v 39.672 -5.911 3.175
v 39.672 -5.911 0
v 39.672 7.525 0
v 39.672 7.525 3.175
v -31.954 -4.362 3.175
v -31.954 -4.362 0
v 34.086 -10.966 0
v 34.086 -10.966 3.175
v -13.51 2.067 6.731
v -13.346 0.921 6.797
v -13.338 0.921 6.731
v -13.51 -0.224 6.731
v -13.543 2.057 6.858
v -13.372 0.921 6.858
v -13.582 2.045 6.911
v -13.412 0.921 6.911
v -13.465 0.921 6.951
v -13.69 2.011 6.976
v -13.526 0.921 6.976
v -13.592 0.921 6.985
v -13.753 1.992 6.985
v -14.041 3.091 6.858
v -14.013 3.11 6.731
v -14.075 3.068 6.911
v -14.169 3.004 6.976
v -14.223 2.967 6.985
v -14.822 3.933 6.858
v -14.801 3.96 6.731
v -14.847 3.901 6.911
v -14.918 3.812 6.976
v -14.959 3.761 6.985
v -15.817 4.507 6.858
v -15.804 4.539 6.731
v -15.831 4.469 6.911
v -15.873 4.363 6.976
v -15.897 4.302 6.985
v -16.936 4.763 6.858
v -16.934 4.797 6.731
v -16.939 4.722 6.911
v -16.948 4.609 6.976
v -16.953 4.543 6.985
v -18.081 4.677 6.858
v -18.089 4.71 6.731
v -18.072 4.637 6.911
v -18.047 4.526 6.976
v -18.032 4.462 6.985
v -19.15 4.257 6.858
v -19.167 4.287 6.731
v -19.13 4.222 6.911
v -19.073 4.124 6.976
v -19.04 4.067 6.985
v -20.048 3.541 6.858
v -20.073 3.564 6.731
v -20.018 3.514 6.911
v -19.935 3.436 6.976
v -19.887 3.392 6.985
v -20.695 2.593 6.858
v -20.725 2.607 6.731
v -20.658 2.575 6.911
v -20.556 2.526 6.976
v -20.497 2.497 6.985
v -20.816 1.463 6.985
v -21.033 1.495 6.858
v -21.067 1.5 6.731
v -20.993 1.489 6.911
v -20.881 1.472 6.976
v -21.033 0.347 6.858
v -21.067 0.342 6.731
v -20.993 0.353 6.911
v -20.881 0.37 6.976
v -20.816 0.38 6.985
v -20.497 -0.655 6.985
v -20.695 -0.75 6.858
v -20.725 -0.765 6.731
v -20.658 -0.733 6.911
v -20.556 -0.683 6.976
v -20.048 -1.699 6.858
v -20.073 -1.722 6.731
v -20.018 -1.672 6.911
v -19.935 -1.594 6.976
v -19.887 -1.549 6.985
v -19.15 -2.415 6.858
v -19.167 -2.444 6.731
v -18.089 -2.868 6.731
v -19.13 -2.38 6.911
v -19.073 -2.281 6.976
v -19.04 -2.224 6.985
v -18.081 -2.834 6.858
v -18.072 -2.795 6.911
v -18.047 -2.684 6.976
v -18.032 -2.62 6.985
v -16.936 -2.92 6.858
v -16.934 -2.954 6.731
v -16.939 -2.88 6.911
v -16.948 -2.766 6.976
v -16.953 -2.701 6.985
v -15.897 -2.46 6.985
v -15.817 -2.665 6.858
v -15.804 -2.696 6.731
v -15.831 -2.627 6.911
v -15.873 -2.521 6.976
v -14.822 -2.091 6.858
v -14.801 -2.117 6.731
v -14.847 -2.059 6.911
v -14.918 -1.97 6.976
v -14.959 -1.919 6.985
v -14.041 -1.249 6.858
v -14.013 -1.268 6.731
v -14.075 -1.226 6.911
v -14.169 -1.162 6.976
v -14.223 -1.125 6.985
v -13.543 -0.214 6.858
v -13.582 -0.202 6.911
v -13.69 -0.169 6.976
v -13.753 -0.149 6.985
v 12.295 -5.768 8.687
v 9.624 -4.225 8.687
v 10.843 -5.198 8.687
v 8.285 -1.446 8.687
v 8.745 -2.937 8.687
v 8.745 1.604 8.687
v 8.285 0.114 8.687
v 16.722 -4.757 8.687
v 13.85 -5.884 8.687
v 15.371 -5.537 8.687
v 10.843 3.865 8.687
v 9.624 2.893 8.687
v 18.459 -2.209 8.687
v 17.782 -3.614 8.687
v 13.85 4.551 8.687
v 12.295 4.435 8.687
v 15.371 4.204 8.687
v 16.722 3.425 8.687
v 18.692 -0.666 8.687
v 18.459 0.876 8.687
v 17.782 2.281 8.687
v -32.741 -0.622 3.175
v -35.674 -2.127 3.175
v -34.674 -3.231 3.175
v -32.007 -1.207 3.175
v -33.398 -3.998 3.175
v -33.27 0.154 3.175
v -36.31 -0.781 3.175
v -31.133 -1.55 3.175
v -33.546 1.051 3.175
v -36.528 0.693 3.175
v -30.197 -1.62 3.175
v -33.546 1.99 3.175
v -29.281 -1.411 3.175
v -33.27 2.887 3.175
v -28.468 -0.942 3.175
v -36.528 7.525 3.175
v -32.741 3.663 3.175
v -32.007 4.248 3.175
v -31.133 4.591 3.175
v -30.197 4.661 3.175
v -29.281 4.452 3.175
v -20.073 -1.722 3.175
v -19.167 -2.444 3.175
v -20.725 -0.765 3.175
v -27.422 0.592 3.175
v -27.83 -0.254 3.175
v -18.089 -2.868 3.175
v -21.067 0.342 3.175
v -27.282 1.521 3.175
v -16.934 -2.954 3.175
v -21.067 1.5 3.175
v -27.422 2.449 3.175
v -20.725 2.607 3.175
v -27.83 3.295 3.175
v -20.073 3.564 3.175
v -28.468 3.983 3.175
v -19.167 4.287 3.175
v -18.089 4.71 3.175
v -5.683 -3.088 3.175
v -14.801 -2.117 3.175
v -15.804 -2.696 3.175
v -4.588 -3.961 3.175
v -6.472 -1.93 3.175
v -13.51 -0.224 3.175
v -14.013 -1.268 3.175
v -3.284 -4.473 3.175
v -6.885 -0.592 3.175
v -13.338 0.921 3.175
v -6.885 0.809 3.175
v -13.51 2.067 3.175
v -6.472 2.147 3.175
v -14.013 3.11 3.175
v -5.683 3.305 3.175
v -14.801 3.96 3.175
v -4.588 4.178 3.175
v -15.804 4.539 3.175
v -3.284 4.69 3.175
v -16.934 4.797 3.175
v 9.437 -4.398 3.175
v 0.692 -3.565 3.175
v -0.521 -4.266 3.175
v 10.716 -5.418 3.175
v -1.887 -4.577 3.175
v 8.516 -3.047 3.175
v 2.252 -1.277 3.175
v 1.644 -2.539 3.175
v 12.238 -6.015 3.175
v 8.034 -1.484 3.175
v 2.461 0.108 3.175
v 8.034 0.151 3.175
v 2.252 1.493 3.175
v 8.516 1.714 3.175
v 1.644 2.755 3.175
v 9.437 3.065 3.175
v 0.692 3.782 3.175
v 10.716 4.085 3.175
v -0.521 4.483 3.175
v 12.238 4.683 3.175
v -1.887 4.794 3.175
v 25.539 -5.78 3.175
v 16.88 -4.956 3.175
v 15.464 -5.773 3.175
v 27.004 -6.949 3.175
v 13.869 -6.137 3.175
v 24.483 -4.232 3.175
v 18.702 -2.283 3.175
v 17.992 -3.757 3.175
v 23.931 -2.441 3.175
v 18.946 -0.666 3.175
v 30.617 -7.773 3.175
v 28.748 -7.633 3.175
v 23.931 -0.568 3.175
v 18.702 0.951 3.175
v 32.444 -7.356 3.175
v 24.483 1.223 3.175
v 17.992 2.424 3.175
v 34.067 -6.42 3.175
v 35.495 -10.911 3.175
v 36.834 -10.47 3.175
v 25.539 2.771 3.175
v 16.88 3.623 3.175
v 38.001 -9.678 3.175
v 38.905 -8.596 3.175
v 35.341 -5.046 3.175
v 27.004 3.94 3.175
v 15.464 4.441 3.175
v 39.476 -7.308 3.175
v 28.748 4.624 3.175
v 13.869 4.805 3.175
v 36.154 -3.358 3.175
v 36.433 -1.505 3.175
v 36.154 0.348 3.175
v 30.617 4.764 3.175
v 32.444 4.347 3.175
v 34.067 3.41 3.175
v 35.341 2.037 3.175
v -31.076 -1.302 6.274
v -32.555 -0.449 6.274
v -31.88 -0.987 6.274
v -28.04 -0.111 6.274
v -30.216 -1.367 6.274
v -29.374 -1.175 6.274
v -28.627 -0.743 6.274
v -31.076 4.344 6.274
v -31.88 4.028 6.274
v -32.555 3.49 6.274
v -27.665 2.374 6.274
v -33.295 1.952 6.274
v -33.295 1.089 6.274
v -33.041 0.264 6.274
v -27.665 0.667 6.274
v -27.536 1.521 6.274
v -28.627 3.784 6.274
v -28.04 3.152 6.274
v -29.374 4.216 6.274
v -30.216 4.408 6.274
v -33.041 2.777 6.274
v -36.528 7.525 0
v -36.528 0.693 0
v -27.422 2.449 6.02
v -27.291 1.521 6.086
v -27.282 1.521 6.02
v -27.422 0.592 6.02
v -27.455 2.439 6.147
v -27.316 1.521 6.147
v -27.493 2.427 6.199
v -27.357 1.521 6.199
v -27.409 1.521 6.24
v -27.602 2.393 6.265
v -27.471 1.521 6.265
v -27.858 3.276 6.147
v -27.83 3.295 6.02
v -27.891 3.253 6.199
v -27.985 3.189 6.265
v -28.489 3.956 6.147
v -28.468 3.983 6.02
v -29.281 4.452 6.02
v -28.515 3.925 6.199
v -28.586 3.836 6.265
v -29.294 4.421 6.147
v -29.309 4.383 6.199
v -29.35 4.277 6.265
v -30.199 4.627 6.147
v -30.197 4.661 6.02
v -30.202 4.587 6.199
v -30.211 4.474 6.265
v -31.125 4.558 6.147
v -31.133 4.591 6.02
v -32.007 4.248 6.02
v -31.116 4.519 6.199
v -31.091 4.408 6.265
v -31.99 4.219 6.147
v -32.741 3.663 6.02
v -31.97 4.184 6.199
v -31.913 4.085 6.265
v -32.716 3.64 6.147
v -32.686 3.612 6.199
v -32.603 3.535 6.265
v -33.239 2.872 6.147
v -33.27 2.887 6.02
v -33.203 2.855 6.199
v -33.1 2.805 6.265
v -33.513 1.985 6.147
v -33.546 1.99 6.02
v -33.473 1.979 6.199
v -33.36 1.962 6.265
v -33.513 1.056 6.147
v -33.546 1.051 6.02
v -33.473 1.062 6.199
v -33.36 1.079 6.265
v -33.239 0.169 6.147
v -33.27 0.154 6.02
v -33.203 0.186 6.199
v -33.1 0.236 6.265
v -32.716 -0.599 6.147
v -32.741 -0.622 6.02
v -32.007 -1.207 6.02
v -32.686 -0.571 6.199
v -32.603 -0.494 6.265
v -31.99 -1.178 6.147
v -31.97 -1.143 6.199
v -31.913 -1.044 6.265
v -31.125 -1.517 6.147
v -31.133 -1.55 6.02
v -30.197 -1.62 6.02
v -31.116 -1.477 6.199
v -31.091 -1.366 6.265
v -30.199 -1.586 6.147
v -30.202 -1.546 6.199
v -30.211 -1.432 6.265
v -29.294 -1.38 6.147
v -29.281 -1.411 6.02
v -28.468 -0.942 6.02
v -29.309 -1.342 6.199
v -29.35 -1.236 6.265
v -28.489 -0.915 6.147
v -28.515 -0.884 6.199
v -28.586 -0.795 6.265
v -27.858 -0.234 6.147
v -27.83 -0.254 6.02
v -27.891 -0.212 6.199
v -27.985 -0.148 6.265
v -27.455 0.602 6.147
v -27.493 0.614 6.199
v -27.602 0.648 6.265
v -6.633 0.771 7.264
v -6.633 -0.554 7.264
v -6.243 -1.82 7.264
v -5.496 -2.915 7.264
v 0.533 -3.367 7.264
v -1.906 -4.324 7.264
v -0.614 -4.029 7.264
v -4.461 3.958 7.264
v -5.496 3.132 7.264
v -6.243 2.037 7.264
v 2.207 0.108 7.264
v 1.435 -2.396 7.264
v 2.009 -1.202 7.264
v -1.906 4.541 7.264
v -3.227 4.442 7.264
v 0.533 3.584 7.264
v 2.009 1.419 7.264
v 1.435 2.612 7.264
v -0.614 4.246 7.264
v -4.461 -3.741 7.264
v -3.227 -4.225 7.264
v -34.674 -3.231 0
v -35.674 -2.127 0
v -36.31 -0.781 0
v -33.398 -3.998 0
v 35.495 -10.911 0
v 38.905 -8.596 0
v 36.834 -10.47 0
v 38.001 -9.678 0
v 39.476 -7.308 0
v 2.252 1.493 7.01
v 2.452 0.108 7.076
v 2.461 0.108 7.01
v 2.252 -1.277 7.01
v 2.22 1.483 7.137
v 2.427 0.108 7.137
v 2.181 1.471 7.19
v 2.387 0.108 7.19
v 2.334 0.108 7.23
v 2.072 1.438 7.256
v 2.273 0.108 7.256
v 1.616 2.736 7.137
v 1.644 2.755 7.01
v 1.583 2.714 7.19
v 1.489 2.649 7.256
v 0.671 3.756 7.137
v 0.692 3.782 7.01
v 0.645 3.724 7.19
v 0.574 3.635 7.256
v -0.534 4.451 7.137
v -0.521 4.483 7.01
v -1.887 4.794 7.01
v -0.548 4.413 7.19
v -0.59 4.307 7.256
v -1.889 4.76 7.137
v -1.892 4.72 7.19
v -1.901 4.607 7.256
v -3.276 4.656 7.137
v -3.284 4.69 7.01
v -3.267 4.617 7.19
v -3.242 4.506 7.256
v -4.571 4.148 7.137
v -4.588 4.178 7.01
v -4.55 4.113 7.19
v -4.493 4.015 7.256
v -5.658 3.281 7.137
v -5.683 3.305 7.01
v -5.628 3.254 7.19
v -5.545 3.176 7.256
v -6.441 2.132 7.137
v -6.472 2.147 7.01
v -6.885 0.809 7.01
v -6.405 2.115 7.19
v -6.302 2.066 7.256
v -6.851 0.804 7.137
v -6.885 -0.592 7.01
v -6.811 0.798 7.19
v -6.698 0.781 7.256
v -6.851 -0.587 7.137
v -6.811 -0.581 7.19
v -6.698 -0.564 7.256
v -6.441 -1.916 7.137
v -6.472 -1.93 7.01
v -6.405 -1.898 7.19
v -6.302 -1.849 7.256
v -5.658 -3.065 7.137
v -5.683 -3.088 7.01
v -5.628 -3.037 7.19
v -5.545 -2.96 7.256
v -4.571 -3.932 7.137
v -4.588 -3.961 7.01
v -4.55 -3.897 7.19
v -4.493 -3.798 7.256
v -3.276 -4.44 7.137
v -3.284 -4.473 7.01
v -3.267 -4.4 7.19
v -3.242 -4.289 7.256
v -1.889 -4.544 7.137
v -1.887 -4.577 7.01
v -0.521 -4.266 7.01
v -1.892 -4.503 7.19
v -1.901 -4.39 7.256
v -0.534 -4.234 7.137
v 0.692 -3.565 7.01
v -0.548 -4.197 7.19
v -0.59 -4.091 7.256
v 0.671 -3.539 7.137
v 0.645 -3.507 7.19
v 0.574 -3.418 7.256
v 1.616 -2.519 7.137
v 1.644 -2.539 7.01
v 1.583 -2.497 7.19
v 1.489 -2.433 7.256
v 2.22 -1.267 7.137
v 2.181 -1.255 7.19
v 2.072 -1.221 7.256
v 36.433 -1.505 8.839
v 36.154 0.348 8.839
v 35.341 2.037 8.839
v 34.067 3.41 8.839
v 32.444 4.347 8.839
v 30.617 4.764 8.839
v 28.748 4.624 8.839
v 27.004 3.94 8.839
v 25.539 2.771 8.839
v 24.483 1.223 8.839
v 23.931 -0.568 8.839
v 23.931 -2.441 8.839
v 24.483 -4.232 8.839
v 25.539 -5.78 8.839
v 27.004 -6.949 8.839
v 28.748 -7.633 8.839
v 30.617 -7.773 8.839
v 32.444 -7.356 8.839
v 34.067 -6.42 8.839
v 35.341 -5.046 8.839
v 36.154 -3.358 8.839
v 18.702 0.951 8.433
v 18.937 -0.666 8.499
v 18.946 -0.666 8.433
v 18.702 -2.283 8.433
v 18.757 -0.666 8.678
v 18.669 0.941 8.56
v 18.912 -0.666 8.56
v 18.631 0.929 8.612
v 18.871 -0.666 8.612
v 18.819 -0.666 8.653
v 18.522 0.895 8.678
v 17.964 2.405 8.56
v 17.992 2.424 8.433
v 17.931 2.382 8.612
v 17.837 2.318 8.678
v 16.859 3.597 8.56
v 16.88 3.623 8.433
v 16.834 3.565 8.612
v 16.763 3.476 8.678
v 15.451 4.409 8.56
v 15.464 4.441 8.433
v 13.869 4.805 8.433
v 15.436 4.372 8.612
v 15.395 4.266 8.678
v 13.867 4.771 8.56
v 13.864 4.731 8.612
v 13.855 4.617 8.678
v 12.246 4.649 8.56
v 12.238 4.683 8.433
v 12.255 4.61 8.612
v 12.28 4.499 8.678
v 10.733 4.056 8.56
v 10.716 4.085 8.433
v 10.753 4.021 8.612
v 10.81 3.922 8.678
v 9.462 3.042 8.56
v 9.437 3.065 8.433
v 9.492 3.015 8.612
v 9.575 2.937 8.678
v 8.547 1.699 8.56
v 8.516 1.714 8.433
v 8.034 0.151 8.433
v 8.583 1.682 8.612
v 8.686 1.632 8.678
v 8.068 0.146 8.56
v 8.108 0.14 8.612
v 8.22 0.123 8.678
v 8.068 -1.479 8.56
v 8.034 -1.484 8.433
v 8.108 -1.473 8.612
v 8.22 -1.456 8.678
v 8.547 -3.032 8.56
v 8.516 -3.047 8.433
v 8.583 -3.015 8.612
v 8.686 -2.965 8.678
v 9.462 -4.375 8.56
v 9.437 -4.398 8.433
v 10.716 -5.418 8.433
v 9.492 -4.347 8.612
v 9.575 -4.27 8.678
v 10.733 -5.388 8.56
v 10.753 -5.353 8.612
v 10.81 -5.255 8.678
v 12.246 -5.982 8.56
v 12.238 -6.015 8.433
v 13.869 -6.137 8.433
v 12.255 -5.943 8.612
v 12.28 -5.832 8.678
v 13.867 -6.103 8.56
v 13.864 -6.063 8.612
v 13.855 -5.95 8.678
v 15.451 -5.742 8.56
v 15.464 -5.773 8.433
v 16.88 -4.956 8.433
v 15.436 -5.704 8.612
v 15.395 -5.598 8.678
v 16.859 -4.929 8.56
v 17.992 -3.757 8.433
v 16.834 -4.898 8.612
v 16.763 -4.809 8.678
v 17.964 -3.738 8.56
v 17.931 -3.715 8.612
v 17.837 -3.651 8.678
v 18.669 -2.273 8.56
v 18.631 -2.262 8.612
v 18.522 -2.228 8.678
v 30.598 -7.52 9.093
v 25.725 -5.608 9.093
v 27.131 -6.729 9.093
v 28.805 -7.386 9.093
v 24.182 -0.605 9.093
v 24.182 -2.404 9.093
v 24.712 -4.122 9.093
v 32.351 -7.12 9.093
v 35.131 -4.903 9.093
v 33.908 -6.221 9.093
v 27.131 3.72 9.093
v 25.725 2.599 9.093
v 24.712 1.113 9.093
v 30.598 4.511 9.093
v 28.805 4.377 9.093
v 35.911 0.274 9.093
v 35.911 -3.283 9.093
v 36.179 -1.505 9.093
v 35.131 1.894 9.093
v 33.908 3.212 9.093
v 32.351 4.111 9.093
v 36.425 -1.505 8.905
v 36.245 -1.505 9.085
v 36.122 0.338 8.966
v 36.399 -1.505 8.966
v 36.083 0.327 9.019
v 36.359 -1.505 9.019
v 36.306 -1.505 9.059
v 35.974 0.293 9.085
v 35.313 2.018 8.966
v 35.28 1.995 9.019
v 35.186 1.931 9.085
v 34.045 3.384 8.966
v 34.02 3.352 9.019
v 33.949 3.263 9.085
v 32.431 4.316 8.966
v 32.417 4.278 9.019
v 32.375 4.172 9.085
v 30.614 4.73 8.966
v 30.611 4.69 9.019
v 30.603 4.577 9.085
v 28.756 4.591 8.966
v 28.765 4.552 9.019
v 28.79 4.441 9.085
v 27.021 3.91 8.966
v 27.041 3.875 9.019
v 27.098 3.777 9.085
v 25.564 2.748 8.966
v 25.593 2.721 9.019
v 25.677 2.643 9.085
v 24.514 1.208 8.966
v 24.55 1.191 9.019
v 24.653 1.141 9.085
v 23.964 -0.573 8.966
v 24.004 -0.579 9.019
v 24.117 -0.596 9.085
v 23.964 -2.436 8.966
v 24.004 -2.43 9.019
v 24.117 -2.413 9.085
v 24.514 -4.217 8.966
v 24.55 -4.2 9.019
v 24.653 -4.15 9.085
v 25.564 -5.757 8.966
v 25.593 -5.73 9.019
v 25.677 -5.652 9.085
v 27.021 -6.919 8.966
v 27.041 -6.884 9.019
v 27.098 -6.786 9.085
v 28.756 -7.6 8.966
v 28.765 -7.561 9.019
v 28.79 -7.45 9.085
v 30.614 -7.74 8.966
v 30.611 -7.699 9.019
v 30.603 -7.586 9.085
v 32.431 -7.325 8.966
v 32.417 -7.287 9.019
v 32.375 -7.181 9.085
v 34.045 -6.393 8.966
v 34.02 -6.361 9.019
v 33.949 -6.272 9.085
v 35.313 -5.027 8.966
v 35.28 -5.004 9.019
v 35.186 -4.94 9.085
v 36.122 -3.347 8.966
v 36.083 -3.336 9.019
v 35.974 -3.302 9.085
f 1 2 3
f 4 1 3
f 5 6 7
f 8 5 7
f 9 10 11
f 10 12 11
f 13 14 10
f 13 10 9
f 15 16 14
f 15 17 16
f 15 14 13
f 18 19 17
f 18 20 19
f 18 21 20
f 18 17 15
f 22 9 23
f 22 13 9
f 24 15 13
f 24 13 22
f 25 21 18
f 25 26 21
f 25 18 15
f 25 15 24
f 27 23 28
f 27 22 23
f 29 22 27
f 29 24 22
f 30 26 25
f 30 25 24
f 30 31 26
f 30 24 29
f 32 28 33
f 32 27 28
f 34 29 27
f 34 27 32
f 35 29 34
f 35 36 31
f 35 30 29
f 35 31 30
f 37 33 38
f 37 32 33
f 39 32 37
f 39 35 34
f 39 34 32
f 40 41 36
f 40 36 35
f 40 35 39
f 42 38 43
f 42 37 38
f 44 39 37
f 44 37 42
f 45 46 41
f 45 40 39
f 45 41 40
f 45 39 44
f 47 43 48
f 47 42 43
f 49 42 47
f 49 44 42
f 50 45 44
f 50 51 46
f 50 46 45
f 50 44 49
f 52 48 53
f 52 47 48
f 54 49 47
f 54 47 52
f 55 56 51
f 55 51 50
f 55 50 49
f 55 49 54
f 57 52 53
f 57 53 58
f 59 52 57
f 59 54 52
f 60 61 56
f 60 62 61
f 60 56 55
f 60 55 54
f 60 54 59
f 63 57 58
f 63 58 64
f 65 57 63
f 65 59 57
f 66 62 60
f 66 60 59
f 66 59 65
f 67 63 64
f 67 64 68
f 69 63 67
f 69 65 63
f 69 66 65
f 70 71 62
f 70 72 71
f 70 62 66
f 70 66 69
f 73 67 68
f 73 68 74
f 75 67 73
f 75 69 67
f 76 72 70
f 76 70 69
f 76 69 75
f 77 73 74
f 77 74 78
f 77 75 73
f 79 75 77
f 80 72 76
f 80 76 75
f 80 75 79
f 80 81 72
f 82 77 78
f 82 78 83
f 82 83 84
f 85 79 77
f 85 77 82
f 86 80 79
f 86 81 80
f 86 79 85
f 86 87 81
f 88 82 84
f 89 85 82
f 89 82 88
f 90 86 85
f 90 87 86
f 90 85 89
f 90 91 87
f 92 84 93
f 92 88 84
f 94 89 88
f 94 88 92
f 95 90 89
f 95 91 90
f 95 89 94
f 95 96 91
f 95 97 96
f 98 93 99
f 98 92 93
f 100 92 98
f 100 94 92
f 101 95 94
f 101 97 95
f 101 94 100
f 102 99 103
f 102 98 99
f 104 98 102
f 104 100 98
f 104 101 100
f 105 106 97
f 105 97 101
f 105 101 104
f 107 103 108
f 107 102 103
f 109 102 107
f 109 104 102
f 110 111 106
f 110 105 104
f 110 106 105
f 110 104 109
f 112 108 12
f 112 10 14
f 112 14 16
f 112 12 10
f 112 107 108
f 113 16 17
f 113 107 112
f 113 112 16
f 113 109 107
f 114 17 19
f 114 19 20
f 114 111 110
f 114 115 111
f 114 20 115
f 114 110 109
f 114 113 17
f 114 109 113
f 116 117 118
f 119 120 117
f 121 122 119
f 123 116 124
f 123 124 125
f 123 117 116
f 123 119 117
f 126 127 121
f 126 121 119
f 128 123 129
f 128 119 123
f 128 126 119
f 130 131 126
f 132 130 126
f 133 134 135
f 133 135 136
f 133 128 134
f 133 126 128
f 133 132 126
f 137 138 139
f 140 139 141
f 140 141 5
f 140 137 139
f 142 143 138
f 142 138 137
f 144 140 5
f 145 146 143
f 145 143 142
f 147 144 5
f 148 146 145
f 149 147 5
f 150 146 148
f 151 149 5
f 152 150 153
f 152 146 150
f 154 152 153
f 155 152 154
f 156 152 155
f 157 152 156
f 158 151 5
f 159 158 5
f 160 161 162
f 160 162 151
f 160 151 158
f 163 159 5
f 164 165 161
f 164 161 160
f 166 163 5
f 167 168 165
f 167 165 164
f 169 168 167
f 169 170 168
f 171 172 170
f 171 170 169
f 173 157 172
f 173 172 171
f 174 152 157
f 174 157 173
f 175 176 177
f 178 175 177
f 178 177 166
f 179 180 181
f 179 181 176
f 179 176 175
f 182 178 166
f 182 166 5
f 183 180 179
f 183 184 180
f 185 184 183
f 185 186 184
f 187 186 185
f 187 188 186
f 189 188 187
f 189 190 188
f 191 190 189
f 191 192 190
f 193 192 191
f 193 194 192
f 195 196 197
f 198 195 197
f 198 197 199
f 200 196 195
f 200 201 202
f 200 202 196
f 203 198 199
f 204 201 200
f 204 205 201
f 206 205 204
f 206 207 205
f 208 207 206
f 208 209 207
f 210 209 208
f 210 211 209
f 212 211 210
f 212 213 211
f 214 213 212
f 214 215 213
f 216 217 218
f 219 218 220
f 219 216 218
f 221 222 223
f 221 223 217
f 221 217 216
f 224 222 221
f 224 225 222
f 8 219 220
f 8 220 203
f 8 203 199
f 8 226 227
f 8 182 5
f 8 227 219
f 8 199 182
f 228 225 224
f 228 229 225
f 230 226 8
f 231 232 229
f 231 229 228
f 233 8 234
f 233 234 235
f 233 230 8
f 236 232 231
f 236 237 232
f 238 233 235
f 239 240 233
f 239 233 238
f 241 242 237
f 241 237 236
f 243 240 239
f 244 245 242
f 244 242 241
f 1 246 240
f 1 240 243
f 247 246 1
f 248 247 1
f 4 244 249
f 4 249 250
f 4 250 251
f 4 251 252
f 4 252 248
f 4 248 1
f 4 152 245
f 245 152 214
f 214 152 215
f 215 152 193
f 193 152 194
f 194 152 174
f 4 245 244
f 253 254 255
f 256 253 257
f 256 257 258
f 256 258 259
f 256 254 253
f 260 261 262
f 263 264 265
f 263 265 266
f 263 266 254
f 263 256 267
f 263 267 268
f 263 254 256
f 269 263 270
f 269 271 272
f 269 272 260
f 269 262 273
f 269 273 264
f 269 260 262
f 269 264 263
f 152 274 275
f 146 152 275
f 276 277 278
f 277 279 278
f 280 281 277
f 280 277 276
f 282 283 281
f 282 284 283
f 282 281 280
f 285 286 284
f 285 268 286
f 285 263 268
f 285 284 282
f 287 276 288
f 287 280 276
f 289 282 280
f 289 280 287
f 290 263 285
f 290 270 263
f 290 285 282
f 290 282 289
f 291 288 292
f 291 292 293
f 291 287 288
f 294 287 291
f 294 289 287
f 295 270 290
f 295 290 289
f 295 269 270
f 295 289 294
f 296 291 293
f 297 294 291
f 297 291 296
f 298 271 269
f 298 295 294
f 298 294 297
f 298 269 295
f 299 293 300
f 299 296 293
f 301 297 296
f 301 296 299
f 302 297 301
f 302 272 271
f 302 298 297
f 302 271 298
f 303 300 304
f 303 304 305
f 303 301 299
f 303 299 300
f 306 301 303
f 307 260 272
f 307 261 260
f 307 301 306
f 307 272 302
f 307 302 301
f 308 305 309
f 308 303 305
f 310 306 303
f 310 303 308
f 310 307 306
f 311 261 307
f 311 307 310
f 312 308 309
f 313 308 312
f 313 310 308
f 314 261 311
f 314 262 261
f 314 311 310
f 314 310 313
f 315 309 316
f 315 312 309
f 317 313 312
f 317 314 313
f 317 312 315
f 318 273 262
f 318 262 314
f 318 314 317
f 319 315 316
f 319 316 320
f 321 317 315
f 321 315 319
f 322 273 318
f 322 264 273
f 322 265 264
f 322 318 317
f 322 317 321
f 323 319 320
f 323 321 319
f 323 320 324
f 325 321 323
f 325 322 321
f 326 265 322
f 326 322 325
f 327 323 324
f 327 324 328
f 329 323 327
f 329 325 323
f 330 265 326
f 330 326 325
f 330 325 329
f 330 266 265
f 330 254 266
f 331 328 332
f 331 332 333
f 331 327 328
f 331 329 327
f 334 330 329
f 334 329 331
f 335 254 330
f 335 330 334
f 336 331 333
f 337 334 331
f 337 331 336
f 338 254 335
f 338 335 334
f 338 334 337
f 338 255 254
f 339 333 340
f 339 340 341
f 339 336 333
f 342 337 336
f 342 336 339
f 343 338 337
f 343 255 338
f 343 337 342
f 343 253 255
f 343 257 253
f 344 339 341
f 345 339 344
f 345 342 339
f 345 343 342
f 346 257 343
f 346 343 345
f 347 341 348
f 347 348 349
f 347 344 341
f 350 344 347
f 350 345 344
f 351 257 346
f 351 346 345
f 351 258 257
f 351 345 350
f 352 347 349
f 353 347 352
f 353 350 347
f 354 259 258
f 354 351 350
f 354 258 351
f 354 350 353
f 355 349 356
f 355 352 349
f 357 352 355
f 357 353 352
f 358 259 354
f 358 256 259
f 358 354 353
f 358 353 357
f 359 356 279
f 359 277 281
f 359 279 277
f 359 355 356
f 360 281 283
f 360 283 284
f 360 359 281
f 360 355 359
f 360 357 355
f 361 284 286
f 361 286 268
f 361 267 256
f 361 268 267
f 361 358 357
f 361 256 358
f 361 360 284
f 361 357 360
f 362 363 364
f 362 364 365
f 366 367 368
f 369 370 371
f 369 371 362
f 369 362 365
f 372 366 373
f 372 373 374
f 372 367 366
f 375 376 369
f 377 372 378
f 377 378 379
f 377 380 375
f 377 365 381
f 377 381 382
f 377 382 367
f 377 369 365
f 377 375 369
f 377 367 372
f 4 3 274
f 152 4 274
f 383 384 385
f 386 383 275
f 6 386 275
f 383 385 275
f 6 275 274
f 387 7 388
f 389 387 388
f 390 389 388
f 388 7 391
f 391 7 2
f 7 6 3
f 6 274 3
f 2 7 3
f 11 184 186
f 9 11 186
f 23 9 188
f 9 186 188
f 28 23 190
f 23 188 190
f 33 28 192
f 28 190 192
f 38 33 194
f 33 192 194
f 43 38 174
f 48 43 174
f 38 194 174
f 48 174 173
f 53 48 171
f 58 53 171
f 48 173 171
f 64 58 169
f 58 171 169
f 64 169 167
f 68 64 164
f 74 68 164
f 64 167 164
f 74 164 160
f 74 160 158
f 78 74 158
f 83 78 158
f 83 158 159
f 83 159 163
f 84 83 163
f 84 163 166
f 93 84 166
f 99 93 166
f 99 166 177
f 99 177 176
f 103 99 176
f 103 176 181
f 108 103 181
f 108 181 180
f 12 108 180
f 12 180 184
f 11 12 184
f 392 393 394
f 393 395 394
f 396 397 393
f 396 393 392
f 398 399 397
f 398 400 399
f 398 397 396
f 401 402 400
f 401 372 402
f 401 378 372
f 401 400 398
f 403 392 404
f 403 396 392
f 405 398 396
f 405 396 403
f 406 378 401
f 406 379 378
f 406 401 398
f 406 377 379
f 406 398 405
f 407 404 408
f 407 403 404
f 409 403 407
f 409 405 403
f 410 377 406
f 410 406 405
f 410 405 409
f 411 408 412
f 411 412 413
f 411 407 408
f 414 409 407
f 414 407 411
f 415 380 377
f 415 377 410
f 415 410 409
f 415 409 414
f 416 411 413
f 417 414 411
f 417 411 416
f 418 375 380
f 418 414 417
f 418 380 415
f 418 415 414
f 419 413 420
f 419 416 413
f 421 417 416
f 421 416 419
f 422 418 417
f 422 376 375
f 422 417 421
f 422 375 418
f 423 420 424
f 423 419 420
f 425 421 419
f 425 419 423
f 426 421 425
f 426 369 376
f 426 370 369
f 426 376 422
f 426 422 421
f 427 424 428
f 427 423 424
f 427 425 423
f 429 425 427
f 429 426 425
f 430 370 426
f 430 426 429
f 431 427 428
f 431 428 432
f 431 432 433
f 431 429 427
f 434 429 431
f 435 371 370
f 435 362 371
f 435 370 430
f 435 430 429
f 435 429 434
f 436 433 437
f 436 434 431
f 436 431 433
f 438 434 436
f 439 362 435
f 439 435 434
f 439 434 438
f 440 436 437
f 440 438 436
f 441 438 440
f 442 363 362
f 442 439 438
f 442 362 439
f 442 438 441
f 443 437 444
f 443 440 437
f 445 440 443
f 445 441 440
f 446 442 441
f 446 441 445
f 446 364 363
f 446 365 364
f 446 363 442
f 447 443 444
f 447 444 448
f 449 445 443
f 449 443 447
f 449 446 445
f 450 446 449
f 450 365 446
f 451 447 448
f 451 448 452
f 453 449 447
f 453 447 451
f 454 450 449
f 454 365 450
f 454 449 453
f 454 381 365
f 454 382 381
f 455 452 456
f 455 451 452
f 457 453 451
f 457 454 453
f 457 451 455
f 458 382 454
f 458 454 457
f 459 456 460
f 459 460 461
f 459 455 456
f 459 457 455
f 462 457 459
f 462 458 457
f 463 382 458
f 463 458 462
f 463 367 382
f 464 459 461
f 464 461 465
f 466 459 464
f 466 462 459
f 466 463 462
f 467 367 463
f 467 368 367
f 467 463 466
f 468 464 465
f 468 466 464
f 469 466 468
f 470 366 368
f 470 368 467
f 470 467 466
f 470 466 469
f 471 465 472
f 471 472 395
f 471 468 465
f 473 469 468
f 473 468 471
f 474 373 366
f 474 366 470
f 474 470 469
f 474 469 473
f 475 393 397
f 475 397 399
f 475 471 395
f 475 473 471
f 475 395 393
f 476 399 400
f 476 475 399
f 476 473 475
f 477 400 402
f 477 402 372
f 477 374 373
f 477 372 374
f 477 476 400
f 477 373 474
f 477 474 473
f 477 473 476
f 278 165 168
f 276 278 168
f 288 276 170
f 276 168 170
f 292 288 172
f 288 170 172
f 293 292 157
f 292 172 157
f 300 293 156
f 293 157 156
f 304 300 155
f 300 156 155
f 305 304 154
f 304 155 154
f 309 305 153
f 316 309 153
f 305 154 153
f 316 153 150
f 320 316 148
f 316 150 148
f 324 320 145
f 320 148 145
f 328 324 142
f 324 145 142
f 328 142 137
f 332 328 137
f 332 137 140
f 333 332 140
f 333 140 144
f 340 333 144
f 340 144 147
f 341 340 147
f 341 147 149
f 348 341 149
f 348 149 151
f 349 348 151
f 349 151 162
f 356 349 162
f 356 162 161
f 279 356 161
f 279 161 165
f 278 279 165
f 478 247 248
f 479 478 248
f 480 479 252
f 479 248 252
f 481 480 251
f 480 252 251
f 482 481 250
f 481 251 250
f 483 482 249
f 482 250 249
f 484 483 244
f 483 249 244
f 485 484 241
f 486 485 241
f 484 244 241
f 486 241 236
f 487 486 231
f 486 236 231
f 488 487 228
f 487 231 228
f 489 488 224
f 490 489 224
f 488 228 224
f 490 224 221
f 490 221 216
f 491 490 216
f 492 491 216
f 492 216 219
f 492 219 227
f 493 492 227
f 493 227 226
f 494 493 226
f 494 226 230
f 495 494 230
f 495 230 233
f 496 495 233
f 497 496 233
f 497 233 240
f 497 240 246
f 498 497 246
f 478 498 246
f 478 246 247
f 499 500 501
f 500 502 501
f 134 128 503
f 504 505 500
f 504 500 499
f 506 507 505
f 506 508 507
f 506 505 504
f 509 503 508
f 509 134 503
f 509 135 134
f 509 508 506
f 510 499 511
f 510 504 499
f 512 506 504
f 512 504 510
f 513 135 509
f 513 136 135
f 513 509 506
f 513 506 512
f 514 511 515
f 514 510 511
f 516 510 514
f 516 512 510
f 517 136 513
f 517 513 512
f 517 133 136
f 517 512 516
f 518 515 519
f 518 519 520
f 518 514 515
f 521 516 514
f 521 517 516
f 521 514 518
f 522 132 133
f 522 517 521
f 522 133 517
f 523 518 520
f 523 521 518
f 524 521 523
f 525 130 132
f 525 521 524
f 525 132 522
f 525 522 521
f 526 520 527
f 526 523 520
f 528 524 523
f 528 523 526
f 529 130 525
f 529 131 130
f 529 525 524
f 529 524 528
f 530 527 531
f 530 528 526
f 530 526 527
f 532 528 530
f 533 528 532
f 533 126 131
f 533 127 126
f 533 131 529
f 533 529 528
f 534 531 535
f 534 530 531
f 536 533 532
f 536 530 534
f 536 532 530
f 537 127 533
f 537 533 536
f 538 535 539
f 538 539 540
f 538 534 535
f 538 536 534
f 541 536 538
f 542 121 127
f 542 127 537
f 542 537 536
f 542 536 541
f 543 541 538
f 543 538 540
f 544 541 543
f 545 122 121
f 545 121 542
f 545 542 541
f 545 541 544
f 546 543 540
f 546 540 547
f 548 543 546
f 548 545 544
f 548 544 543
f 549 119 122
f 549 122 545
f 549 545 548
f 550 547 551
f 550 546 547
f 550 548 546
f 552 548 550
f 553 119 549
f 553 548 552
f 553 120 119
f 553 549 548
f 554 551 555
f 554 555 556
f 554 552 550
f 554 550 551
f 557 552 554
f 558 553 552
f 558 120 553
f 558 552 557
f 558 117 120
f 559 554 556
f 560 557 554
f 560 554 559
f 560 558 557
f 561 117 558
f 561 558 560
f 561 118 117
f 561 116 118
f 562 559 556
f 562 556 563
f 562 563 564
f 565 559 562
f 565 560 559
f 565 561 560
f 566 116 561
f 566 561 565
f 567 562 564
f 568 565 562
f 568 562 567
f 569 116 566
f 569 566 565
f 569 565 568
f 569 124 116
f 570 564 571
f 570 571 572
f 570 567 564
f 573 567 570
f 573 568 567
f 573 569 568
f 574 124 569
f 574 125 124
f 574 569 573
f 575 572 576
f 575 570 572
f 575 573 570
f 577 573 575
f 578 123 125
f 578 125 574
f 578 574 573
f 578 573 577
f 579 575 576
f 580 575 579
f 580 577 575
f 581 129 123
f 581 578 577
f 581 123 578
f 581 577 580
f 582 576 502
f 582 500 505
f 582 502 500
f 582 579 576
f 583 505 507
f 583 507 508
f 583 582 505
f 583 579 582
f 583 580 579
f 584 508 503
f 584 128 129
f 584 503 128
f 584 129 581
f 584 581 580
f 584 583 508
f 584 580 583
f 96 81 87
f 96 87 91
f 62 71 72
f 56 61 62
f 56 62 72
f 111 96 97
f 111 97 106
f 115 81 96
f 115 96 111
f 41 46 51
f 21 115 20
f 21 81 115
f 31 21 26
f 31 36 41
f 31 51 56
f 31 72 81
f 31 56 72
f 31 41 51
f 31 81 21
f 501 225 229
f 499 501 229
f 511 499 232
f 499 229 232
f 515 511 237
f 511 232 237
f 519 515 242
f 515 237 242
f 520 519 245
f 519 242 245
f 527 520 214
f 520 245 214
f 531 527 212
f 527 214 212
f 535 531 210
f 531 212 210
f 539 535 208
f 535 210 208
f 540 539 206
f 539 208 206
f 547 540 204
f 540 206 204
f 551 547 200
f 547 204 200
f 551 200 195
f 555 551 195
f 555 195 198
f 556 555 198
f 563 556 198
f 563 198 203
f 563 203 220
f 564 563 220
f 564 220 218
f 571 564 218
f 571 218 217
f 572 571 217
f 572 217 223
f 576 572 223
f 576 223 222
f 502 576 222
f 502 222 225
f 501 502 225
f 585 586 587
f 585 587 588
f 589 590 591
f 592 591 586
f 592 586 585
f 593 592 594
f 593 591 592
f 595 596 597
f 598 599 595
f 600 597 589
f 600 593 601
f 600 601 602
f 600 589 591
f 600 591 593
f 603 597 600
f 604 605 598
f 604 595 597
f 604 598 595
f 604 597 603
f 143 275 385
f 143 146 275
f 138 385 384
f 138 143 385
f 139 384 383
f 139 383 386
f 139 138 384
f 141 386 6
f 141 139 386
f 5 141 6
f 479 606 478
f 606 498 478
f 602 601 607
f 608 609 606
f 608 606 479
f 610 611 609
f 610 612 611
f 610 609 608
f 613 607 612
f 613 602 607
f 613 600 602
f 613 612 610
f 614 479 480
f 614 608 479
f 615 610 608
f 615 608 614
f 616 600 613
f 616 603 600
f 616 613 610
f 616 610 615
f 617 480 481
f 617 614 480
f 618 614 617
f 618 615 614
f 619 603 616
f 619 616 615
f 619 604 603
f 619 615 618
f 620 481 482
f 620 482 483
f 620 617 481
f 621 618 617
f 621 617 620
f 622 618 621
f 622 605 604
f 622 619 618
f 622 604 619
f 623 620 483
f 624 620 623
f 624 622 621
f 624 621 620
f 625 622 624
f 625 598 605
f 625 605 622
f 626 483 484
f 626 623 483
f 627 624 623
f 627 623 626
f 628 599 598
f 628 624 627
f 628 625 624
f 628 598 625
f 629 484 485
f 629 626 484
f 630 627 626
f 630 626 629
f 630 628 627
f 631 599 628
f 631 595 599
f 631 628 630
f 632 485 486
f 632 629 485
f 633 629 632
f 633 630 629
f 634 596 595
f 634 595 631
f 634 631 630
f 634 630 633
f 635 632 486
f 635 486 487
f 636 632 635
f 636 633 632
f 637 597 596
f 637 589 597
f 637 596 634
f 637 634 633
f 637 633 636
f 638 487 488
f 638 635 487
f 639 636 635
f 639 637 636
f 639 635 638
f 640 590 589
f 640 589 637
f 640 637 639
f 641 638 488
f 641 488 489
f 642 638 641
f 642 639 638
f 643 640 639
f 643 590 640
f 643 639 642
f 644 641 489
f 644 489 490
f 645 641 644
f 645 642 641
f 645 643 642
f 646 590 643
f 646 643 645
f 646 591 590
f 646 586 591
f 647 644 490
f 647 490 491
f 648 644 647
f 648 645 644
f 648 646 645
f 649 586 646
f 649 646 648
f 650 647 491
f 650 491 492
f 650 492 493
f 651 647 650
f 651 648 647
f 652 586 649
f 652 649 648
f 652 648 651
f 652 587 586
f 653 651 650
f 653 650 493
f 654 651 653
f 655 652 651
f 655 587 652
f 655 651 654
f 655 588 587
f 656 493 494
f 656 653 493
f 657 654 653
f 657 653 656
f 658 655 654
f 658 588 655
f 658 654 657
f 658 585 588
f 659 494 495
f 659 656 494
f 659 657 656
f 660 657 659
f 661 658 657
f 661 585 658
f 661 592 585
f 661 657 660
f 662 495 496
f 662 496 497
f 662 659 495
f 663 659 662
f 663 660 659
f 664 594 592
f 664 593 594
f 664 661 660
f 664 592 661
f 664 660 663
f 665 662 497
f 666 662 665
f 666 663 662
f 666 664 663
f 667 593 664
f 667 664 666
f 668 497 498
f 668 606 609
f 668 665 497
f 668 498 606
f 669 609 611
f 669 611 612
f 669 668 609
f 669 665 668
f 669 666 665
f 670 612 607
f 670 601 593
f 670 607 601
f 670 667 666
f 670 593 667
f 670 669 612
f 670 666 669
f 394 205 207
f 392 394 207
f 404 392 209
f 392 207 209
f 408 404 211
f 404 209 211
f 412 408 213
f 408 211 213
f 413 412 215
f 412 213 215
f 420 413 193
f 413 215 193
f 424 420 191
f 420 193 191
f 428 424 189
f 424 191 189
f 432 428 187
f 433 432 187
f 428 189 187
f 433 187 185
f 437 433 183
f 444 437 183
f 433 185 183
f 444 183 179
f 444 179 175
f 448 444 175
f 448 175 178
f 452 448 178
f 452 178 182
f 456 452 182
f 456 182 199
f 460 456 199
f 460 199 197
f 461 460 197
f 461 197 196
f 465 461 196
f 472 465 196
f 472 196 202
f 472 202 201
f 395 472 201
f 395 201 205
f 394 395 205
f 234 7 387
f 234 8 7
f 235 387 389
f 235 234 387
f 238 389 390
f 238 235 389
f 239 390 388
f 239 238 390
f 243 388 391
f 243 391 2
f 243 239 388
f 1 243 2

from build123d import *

# Parameters (mm, degrees)
F2_R     = 3.1496
F2_R_2   = 4.699
F2_R_3   = 3.8862
F2_R_4   = 5.4864
F2_R_5   = 6.2865
F3_DEPTH = 3.175
F1_R     = 6.2865
F4_DEPTH = 9.0932
F0_R     = 5.4864
F5_DEPTH = 8.6868
F6_DEPTH = 7.2644
F7_DEPTH = 6.985
F8_DEPTH = 6.2738
F9_R     = 5.08
F10_R    = 0.254


with BuildPart() as f3:
    # F2 (on face) → F3 (new body)
    with BuildSketch(Plane.XY):
        Polygon((-36.528022, 7.525173), (-36.528022, -3.904827), (39.671978, -11.524827), (39.671978, 7.525173), align=None)
        with Locations((-30.432022, 1.520613)):
            Circle(F2_R, mode=Mode.SUBTRACT)
        with Locations((-2.238022, 0.108373)):
            Circle(F2_R_2, mode=Mode.SUBTRACT)
        with Locations((-17.224022, 0.921173)):
            Circle(F2_R_3, mode=Mode.SUBTRACT)
        with Locations((13.459178, -0.666327)):
            Circle(F2_R_4, mode=Mode.SUBTRACT)
        with Locations((30.146978, -1.504527)):
            Circle(F2_R_5, mode=Mode.SUBTRACT)
        with Locations((30.146978, -1.504527)):
            Circle(F2_R_5)
        with Locations((13.459178, -0.666327)):
            Circle(F2_R_4)
        with Locations((-2.238022, 0.108373)):
            Circle(F2_R_2)
        with Locations((-17.224022, 0.921173)):
            Circle(F2_R_3)
        with Locations((-30.432022, 1.520613)):
            Circle(F2_R)
    extrude(amount=F3_DEPTH)

    # F1 (on face) → F4 (join)
    with BuildSketch(Plane.XY):
        with Locations((30.146978, -1.504527)):
            Circle(F1_R)
    extrude(amount=F4_DEPTH)

    # F0 (on Top) → F5 (join)
    with BuildSketch(Plane.XY):
        with Locations((13.459178, -0.666327)):
            Circle(F0_R)
    extrude(amount=F5_DEPTH)

    # F2 (on face) → F6 (join)
    with BuildSketch(Plane.XY):
        with Locations((-2.238022, 0.108373)):
            Circle(F2_R_2)
    extrude(amount=F6_DEPTH)

    # F2 (on face) → F7 (join)
    with BuildSketch(Plane.XY):
        with Locations((-17.224022, 0.921173)):
            Circle(F2_R_3)
    extrude(amount=F7_DEPTH)

    # F2 (on face) → F8 (join)
    with BuildSketch(Plane.XY):
        with Locations((-30.432022, 1.520613)):
            Circle(F2_R)
    extrude(amount=F8_DEPTH)

    # F9
    f9_edges = [f3.edges().sort_by_distance(p)[0] for p in [
        (39.671978, -11.524827, 1.5875),
        (-36.528022, -3.904827, 1.5875),
    ]]
    fillet(f9_edges, radius=F9_R)

    # F10
    f10_edges = [f3.edges().sort_by_distance(p)[0] for p in [
        (23.860478, -1.504527, 9.0932),
        (7.972778, -0.666327, 8.6868),
        (-6.937022, 0.108373, 7.2644),
        (-21.110222, 0.921173, 6.985),
        (-33.581622, 1.520613, 6.2738),
    ]]
    fillet(f10_edges, radius=F10_R)


solid = f3.part
